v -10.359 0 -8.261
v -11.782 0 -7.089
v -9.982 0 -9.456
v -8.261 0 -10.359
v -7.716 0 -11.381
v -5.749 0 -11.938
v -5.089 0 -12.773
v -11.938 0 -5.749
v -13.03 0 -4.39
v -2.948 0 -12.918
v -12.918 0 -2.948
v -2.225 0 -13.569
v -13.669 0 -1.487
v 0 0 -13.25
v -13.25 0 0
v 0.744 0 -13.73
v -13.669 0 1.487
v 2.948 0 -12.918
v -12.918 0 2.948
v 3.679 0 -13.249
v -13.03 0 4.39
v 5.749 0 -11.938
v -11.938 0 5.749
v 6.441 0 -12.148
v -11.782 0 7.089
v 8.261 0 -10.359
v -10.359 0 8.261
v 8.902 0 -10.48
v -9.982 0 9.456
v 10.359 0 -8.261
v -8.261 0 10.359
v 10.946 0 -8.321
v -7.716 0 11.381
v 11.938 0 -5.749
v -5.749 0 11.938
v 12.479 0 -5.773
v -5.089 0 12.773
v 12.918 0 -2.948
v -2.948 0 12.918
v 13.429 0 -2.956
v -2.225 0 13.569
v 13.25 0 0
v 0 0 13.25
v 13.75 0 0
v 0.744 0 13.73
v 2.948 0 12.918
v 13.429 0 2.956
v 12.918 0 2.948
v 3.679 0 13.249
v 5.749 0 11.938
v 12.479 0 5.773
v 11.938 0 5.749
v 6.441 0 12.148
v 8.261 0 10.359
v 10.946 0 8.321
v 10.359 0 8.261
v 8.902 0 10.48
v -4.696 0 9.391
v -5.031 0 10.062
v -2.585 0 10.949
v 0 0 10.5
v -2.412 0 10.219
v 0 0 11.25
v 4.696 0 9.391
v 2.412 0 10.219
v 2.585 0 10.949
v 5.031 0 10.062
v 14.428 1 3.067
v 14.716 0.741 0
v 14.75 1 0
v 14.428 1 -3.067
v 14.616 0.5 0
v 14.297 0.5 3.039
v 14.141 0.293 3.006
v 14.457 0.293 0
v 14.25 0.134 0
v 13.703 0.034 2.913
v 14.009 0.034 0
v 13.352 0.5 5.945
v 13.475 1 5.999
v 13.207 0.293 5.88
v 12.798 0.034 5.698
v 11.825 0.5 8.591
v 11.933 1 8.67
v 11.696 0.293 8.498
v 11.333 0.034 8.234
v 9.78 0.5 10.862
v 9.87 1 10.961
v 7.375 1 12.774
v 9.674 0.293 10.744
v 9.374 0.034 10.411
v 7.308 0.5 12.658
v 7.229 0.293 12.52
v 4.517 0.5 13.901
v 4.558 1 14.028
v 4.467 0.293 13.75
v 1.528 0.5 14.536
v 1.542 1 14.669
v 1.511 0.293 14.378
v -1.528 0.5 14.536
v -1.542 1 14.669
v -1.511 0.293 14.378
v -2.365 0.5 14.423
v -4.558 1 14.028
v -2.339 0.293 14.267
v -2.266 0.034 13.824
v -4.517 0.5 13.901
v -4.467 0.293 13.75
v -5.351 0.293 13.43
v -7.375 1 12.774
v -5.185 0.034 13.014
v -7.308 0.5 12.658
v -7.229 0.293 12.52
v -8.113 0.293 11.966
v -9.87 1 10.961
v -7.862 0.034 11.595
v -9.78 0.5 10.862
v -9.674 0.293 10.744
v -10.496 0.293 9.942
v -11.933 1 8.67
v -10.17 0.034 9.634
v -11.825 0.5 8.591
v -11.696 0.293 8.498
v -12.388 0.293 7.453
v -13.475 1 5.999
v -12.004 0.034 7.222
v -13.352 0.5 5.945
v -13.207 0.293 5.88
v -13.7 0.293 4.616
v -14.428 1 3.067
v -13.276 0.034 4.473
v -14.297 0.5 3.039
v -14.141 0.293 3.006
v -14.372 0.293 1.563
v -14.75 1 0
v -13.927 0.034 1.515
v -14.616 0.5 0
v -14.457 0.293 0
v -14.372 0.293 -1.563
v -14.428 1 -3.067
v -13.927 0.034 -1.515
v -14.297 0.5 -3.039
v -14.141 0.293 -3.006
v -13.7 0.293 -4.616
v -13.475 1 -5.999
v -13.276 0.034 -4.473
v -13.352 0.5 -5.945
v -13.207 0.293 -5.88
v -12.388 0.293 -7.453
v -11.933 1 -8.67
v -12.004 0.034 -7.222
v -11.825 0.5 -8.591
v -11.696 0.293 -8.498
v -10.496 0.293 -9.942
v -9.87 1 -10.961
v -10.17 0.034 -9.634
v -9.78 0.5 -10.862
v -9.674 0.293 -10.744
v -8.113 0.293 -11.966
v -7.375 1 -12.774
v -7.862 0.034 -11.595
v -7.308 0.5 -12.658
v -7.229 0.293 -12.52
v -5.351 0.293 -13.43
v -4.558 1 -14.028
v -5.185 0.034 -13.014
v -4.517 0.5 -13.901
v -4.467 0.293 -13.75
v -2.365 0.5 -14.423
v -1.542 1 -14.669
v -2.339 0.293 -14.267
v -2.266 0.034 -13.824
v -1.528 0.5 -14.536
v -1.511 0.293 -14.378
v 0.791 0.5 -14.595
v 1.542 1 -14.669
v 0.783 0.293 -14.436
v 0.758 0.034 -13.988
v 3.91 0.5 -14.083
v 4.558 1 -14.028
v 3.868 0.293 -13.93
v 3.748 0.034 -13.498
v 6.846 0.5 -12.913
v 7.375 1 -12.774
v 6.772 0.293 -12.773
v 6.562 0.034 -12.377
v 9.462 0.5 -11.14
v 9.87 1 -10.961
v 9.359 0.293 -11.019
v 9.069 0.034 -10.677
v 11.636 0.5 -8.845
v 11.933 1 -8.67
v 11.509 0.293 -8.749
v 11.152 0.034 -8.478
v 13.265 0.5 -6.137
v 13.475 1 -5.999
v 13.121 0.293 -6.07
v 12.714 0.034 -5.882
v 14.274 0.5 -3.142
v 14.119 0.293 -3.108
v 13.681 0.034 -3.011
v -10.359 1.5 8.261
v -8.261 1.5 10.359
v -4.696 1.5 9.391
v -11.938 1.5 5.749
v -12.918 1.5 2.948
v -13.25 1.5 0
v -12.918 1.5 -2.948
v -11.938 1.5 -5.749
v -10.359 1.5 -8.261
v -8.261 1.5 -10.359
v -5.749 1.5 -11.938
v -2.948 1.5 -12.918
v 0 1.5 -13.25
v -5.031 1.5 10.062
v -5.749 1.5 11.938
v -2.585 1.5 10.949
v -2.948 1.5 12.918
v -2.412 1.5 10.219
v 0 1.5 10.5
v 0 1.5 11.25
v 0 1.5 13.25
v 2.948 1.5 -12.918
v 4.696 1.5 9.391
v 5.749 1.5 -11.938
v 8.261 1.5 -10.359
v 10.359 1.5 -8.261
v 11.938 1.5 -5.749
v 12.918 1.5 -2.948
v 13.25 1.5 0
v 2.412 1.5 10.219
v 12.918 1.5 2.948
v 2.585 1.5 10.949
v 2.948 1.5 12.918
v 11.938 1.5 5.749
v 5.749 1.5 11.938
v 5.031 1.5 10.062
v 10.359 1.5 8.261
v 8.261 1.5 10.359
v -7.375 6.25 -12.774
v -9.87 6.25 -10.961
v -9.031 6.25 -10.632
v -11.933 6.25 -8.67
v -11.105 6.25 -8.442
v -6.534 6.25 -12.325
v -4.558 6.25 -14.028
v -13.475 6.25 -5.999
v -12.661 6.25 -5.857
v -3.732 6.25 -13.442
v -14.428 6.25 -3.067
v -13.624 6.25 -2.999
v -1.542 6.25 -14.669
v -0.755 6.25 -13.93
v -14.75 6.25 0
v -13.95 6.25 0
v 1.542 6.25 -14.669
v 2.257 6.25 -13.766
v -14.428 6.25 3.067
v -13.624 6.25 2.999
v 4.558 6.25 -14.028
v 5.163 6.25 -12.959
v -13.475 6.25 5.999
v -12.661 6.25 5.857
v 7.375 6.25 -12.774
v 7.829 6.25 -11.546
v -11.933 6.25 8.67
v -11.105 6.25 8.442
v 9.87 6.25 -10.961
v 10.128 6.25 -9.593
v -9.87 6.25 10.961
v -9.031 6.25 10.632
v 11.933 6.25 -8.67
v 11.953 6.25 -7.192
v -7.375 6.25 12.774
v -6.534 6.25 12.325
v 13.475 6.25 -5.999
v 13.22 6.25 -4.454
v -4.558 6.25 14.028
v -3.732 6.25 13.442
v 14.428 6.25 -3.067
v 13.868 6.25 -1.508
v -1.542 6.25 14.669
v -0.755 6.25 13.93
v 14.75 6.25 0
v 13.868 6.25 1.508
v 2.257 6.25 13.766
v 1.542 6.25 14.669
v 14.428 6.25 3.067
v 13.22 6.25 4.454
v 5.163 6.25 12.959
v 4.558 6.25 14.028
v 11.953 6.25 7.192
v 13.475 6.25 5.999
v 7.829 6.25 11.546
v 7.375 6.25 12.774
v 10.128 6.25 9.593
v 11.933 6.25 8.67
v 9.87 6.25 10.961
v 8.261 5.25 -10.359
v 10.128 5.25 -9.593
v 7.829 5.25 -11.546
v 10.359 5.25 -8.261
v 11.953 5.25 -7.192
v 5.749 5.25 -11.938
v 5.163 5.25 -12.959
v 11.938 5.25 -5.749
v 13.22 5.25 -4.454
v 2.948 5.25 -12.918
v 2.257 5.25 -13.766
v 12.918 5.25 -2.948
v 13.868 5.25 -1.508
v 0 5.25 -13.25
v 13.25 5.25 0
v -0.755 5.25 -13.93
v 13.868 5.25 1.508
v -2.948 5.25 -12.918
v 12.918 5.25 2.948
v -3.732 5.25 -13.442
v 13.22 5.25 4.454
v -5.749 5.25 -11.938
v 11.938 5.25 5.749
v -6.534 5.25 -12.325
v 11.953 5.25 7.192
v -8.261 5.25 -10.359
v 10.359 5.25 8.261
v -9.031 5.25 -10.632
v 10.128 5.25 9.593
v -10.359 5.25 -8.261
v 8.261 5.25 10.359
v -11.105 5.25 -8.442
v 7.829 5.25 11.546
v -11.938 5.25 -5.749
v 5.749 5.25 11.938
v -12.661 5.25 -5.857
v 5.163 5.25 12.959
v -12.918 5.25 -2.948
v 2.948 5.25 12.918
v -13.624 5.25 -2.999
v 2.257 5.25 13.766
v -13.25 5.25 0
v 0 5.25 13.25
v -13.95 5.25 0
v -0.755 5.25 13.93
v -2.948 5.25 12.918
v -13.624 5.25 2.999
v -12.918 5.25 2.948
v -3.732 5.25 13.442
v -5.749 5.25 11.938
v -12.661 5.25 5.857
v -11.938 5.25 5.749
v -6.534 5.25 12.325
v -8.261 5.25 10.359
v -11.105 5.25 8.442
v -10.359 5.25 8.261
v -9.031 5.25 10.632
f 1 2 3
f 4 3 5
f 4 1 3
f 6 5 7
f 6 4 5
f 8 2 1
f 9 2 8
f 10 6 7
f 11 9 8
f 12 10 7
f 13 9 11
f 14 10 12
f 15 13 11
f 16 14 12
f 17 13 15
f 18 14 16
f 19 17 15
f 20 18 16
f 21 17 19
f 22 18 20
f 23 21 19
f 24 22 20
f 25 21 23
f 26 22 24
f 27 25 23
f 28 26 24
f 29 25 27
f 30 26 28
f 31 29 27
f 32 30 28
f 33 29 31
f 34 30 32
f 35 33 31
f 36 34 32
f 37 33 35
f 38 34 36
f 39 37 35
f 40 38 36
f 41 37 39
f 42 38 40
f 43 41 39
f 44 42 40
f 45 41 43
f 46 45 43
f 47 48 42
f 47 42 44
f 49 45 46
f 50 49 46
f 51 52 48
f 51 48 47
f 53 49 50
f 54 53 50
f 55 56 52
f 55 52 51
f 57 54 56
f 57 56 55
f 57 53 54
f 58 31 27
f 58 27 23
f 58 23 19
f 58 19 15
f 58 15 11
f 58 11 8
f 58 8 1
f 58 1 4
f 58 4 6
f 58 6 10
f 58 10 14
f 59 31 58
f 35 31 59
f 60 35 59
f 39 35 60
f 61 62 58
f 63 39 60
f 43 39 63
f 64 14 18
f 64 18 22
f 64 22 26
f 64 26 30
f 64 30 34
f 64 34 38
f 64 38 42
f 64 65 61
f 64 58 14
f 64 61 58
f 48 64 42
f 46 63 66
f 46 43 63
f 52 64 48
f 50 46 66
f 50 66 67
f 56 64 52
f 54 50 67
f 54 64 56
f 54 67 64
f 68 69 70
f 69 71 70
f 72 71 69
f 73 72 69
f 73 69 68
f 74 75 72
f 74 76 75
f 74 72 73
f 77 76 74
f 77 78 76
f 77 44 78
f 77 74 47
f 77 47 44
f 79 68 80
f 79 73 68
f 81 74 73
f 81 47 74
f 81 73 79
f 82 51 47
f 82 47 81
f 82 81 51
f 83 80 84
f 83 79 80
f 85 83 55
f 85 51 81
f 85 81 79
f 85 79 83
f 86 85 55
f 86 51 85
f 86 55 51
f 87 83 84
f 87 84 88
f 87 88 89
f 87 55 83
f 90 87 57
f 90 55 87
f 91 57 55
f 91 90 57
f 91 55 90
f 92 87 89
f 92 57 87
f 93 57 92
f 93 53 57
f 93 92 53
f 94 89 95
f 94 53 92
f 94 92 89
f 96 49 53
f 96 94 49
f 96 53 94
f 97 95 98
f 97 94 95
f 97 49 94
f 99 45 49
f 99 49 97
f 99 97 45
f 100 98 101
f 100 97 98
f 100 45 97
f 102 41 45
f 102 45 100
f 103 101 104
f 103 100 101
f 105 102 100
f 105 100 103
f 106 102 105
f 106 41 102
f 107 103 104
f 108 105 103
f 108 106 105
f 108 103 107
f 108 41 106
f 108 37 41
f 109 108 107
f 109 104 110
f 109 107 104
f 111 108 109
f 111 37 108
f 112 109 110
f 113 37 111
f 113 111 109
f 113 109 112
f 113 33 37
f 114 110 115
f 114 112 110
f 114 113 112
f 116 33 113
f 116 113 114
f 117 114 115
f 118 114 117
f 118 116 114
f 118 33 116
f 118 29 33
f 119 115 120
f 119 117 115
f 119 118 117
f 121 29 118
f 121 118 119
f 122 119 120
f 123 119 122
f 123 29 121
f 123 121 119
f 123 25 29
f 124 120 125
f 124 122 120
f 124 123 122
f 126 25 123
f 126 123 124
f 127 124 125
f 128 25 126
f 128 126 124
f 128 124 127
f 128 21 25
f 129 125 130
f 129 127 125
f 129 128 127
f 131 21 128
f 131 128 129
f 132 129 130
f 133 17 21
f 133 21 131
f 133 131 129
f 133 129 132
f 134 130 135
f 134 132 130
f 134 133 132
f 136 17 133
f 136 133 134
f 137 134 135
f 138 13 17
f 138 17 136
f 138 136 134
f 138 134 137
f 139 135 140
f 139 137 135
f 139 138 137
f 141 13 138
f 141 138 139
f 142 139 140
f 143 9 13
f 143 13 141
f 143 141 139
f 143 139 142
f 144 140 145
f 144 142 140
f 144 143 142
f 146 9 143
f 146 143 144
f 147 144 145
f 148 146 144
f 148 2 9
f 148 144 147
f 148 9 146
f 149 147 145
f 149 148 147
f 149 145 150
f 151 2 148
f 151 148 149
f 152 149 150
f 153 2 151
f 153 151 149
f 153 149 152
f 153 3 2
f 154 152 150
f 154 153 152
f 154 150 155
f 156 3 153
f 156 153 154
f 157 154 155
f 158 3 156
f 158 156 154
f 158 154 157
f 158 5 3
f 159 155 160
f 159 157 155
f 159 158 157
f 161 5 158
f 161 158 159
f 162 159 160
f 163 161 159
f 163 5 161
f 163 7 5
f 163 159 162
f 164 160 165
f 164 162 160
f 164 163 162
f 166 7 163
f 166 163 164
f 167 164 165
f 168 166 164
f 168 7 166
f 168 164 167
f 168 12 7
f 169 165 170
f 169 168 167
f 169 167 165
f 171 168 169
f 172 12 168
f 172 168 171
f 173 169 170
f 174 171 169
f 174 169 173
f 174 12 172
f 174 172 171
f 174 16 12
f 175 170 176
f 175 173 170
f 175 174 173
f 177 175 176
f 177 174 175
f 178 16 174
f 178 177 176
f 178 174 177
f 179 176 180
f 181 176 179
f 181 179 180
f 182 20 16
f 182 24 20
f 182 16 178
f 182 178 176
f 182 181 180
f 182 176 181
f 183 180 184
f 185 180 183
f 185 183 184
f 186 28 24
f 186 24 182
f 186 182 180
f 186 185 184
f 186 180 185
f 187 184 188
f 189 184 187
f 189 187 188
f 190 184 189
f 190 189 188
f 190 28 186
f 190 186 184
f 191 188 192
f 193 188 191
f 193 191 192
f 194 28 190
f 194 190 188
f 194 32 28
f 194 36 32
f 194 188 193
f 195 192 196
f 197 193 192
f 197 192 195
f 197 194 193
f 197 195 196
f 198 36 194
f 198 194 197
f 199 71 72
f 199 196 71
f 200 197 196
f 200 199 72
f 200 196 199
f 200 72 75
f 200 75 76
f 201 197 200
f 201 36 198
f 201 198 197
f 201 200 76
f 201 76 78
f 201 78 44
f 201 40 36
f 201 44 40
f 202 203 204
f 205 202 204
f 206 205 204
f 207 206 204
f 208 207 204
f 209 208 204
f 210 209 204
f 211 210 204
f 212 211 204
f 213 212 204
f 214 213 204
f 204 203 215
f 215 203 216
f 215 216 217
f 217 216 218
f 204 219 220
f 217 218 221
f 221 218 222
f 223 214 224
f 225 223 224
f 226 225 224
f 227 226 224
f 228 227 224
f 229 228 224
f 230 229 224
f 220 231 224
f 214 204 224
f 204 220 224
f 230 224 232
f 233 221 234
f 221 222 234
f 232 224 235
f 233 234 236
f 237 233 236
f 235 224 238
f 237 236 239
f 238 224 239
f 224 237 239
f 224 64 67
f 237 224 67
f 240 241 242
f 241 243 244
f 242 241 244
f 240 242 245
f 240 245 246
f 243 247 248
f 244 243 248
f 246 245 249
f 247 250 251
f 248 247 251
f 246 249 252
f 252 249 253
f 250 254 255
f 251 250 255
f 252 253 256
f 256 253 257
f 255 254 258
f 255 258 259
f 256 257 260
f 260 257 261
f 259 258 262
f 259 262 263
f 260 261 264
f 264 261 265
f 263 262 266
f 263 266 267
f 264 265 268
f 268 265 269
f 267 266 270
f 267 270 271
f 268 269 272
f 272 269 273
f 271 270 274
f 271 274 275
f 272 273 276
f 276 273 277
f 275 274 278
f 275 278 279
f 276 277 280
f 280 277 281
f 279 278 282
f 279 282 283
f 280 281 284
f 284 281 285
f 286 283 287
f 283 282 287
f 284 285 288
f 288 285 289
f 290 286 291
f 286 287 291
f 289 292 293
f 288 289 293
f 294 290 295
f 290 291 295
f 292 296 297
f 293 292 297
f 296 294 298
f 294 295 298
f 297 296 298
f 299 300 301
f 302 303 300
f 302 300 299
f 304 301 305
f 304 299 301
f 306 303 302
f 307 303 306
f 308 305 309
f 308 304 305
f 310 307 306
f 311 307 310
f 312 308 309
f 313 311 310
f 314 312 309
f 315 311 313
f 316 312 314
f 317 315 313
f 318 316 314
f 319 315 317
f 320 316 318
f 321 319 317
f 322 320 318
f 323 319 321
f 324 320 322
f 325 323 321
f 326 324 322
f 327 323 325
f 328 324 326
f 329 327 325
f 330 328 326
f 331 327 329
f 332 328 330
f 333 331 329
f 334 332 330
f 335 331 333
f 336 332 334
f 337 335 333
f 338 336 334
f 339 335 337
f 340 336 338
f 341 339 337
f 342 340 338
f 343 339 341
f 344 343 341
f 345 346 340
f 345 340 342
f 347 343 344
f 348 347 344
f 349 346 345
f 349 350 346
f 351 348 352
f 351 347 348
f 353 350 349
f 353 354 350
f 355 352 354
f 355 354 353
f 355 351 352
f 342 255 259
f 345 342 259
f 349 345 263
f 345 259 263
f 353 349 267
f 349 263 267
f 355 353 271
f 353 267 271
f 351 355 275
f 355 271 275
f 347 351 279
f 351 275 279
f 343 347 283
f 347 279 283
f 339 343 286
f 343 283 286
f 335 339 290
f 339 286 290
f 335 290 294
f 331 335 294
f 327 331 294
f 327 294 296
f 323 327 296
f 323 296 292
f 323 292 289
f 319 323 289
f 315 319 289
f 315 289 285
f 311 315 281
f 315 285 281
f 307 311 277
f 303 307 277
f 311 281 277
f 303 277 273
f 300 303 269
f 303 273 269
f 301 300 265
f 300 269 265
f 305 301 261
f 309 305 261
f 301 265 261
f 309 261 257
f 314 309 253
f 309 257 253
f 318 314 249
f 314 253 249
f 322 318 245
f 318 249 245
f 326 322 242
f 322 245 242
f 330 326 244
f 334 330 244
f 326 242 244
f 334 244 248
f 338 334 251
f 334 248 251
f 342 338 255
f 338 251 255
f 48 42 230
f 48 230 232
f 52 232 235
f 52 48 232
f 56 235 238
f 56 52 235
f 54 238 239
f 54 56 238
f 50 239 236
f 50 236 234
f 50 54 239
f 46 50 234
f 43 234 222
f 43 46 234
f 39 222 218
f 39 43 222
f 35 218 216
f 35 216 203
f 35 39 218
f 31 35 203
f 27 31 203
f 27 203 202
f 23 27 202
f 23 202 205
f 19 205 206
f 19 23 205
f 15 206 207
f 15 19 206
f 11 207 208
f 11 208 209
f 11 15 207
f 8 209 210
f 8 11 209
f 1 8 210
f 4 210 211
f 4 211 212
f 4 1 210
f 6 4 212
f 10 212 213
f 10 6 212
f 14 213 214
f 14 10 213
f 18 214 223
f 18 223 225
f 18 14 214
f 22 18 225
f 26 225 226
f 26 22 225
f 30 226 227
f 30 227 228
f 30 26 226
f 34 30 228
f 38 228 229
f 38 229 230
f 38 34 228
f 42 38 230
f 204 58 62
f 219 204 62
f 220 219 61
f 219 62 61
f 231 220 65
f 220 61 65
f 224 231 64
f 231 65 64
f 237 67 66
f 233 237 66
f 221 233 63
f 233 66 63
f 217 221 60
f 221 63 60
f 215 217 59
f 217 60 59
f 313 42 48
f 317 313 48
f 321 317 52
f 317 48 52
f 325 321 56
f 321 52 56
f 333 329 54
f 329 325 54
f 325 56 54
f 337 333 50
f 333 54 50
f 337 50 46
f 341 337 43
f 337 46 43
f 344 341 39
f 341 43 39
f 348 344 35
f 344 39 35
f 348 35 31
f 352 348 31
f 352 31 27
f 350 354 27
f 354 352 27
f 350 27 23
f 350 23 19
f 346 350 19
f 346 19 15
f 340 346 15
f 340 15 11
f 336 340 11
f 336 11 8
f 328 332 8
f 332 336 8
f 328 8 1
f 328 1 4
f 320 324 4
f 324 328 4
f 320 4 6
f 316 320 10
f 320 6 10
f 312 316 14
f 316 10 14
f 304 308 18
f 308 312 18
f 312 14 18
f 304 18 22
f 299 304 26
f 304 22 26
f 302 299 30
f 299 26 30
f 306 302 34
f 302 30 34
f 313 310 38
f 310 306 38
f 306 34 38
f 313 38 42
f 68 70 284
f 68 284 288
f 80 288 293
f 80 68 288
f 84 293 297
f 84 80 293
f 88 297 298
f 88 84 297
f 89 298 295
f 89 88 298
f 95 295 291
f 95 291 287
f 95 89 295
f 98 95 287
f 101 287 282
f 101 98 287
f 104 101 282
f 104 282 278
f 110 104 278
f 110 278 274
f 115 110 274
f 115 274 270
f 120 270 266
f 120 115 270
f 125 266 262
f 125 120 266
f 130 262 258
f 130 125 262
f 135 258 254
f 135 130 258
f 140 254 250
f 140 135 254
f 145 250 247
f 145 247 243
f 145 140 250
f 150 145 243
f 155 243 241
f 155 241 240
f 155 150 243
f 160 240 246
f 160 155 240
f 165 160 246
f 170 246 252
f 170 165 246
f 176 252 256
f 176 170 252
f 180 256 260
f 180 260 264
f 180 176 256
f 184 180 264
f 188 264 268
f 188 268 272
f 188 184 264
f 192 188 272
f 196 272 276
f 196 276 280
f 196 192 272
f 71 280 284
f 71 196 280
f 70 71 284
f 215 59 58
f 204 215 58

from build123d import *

# Parameters (mm, degrees)
F0_R     = 14.75
F0_R_2   = 13.25
F1_DEPTH = 6.25
F2_DEPTH = 1.5
F3_R     = 13.95
F3_R_2   = 13.25
F4_DEPTH = 1
F5_R     = 1
F7_DEPTH = 1.5


with BuildPart() as f1:
    # F0 (on Front) → F1 (new body)
    with BuildSketch(Plane.XZ):
        Circle(F0_R)
        Circle(F0_R_2, mode=Mode.SUBTRACT)
    extrude(amount=-F1_DEPTH)

    # F3 (on face) → F4 (cut)
    with BuildSketch(Plane(origin=(0, 6.25, 0), x_dir=(-1, 0, 0), z_dir=(0, 1, 0))):
        Circle(F3_R)
        Circle(F3_R_2, mode=Mode.SUBTRACT)
    extrude(amount=-F4_DEPTH, mode=Mode.SUBTRACT)

    # F5
    f5_edges = [f1.edges().sort_by_distance(p)[0] for p in [
        (-14.75, 0, 0),
    ]]
    fillet(f5_edges, radius=F5_R)


with BuildPart() as f2:
    # F0 (on Front) → F2 (new body)
    with BuildSketch(Plane.XZ):
        Circle(F0_R_2)
    extrude(amount=-F2_DEPTH)

    # F6 (on face) → F7 (cut)
    with BuildSketch(Plane.XZ):
        with BuildLine():
            Line((4.695743, 9.391486), (5.031153, 10.062306))
            ThreePointArc((5.031153, 10.062306), (0, 11.25), (-5.031153, 10.062306))
            Line((-5.031153, 10.062306), (-4.695743, 9.391486))
            ThreePointArc((-4.695743, 9.391486), (0, 10.5), (4.695743, 9.391486))
        make_face()
    extrude(amount=-F7_DEPTH, mode=Mode.SUBTRACT)


solid = Compound([f1.part, f2.part])
